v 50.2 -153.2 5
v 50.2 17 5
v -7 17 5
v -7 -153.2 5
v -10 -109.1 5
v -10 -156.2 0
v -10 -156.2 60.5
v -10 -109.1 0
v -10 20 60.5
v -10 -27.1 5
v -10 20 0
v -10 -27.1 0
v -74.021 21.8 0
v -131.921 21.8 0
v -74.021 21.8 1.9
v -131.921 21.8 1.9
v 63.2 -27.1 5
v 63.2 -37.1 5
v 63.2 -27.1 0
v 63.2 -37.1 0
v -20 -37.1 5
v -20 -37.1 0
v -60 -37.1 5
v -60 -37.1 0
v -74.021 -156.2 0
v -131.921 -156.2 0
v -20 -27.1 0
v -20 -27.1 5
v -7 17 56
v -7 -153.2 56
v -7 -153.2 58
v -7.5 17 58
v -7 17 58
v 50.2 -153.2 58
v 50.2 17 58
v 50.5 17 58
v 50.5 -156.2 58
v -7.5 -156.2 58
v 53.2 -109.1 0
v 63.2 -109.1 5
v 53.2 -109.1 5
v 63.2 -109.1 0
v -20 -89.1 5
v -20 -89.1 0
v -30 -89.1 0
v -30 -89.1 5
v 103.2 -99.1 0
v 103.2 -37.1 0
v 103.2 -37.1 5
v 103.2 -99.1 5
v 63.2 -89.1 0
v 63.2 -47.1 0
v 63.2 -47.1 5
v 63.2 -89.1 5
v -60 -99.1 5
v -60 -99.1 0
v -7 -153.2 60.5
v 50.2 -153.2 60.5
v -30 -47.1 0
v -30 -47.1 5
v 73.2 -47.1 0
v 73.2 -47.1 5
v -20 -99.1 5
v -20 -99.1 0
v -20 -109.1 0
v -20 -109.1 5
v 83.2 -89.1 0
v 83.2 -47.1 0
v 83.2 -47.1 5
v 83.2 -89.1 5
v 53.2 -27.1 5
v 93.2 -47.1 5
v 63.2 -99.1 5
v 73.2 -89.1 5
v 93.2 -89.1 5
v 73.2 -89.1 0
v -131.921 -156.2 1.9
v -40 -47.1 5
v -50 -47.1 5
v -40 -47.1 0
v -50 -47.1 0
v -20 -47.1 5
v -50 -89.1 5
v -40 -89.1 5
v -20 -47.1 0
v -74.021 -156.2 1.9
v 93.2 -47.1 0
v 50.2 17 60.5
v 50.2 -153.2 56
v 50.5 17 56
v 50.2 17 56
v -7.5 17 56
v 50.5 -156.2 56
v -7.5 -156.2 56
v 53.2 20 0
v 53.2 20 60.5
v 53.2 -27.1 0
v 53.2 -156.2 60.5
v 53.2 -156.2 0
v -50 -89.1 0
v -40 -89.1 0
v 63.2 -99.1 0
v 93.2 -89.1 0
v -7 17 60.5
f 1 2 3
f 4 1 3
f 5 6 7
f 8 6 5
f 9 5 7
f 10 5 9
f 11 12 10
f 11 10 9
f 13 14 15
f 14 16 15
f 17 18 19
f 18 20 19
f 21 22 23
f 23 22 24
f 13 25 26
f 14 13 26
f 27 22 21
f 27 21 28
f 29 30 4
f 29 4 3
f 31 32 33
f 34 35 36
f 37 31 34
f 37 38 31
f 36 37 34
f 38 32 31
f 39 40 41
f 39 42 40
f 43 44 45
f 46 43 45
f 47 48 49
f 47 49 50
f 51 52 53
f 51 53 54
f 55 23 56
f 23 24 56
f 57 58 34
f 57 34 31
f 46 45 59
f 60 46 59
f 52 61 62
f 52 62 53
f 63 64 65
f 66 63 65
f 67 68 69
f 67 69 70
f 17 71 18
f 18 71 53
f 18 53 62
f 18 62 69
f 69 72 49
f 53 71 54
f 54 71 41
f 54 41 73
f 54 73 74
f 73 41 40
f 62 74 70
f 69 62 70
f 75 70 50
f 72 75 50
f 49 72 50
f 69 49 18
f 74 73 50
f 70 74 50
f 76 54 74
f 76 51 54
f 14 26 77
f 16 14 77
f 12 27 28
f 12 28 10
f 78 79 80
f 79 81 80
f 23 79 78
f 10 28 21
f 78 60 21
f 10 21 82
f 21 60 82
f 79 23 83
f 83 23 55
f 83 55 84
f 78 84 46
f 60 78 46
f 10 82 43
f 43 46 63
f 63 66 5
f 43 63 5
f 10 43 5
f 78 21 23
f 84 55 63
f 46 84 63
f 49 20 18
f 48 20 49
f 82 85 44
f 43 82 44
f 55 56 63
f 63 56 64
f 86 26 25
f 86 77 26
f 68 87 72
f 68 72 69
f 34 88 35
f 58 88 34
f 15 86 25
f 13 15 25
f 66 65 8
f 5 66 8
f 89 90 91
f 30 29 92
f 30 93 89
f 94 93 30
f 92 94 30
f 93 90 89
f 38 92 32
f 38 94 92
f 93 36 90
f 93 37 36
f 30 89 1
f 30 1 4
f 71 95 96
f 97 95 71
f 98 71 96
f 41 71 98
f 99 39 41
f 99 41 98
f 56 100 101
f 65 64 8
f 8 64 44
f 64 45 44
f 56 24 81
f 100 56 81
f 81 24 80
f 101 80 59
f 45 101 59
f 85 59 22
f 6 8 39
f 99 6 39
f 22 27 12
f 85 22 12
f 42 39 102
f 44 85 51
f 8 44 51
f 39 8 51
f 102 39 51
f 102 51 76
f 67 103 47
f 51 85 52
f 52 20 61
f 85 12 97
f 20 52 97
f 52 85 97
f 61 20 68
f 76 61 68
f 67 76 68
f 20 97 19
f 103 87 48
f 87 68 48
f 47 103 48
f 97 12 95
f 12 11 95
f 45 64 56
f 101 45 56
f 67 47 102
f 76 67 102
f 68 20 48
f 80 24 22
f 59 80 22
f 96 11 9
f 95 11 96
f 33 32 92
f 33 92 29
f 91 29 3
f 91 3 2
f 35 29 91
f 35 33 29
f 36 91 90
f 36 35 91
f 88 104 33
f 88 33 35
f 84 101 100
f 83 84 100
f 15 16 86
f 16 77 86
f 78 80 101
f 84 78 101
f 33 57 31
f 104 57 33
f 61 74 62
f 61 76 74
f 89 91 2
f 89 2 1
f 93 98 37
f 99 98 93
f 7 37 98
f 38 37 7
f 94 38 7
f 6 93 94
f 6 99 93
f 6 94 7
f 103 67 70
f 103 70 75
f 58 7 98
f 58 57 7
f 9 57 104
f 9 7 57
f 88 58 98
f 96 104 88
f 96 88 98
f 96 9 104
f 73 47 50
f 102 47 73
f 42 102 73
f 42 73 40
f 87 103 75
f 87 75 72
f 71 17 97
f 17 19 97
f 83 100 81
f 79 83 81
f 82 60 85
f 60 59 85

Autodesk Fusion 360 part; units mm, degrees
sketch "Sketch1" plane through (0, 0, 0) normal (0, 0, 1) x (1, 0, 0)
  line L0 (-10, 20) -> (53.2, 20)
  line L1 (53.2, 20) -> (53.2, -156.2)
  line L2 (53.2, -156.2) -> (-10, -156.2)
  line L3 (-10, -156.2) -> (-10, 20)
  dimension "d1" = 63.2
  dimension "d2" = 176.2
extrude "Extrude1" add sketch "Sketch1" along normal blind 60.5 makes body 1
sketch "Sketch2" plane through (0, 0, 60.5) normal (0, 0, 1) x (-1, 0, 0)
  line L0 (10, 156.2) -> (-53.2, 156.2)
  line L1 (-53.2, 156.2) -> (-53.2, -20)
  line L2 (-53.2, -20) -> (10, -20)
  line L3 (10, -20) -> (10, 156.2)
  line L4 (7, -17) -> (-50.2, -17)
  line L5 (-50.2, -17) -> (-50.2, 153.2)
  line L6 (-50.2, 153.2) -> (7, 153.2)
  line L7 (7, 153.2) -> (7, -17)
  dimension "d10" = 57.2
  dimension "d11" = 170.2
  dimension "d12" = 3
  dimension "d13" = 3
extrude "Extrude3" cut sketch "Sketch2" against normal blind 55.5 contours L4 L5 L6 L7 bodies 1
sketch "Sketch4" plane through (0, -156.2, 0) normal (0, -1, 0) x (1, 0, 0)
  line L0 (-10, 0) -> (53.2, 0)
  line L1 (53.2, 0) -> (53.2, 60.5)
  line L2 (53.2, 60.5) -> (-10, 60.5)
  line L3 (-10, 60.5) -> (-10, 0)
  line L4 (-7.5, 58) -> (50.5, 58)
  line L5 (50.5, 58) -> (50.5, 56)
  line L6 (50.5, 56) -> (-7.5, 56)
  line L7 (-7.5, 56) -> (-7.5, 58)
  line L8 (50.2, 60.5) -> (-7, 60.5)
  line L9 (-131.921, 1.9) -> (-74.021, 1.9)
  line L10 (-74.021, 1.9) -> (-74.021, 0)
  line L11 (-74.021, 0) -> (-131.921, 0)
  line L12 (-131.921, 0) -> (-131.921, 1.9)
  dimension "d22" = 58
  dimension "d23" = 2
  dimension "d24" = 2.5
  dimension "d25" = 2.5
  dimension "d40" = 1.9
  dimension "d41" = 57.9
extrude "Extrude4" cut sketch "Sketch4" against normal blind 173.2 contours L4 L5 L6 L7 | L9 L10 L11 L12 bodies 1
extrude "Extrude6" add sketch "Sketch4" against normal blind 178 separate body contours L9 L10 L11 L12 makes body 2
sketch "Sketch5" plane through (0, 0, 0) normal (0, 0, -1) x (1, 0, 0)
  line L0 (53.2, 156.2) -> (-10, 156.2)
  line L1 (-10, 156.2) -> (-10, -20)
  line L2 (-10, -20) -> (53.2, -20)
  line L3 (-10, 37.1) -> (-60, 37.1)
  line L4 (-60, 37.1) -> (-60, 99.1)
  line L5 (-60, 99.1) -> (-10, 99.1)
  line L6 (-10, 99.1) -> (-10, 37.1)
  line L7 (53.2, -20) -> (-10, -20)
  line L8 (-50, 47.1) -> (-40, 47.1)
  line L9 (-40, 47.1) -> (-40, 89.1)
  line L10 (-40, 89.1) -> (-50, 89.1)
  line L11 (-50, 89.1) -> (-50, 47.1)
  line L12 (-30, 47.1) -> (-20, 47.1)
  line L13 (-20, 47.1) -> (-20, 89.1)
  line L14 (-20, 89.1) -> (-30, 89.1)
  line L15 (-30, 89.1) -> (-30, 47.1)
  line L16 (21.6, 39.3466) -> (21.6, 140)
  line L17 (-10, -20) -> (-10, 156.2)
  line L18 (83.2, 47.1) -> (83.2, 89.1)
  line L19 (73.2, 89.1) -> (73.2, 47.1)
  line L20 (73.2, 47.1) -> (63.2, 47.1)
  line L21 (53.2, 37.1) -> (103.2, 37.1)
  line L22 (83.2, 89.1) -> (93.2, 89.1)
  line L23 (63.2, 47.1) -> (63.2, 89.1)
  line L24 (53.2, 99.1) -> (53.2, 37.1)
  line L25 (63.2, 89.1) -> (73.2, 89.1)
  line L26 (103.2, 37.1) -> (103.2, 99.1)
  line L27 (93.2, 89.1) -> (93.2, 47.1)
  line L28 (103.2, 99.1) -> (53.2, 99.1)
  line L29 (93.2, 47.1) -> (83.2, 47.1)
  line L30 (-10, 37.1) -> (-20, 37.1)
  line L31 (-20, 37.1) -> (-20, 27.1)
  line L32 (-20, 27.1) -> (-10, 27.1)
  line L33 (-10, 27.1) -> (-10, 37.1)
  line L34 (-10, 99.1) -> (-20, 99.1)
  line L35 (-20, 99.1) -> (-20, 109.1)
  line L36 (-20, 109.1) -> (-10, 109.1)
  line L37 (-10, 109.1) -> (-10, 99.1)
  line L38 (83.2, 89.1) -> (93.2, 89.1)
  line L39 (63.2, 109.1) -> (53.2, 109.1)
  line L40 (53.2, 99.1) -> (63.2, 99.1)
  line L41 (83.2, 47.1) -> (83.2, 89.1)
  line L42 (53.2, 37.1) -> (103.2, 37.1)
  line L43 (63.2, 27.1) -> (53.2, 27.1)
  line L44 (93.2, 47.1) -> (83.2, 47.1)
  line L45 (73.2, 89.1) -> (73.2, 47.1)
  line L46 (63.2, 99.1) -> (63.2, 109.1)
  line L47 (53.2, 37.1) -> (63.2, 37.1)
  line L48 (73.2, 47.1) -> (63.2, 47.1)
  line L49 (103.2, 99.1) -> (53.2, 99.1)
  line L50 (53.2, 99.1) -> (53.2, 37.1)
  line L51 (53.2, 27.1) -> (53.2, 37.1)
  line L52 (63.2, 89.1) -> (73.2, 89.1)
  line L53 (63.2, 47.1) -> (63.2, 89.1)
  line L54 (93.2, 89.1) -> (93.2, 47.1)
  line L55 (53.2, 109.1) -> (53.2, 99.1)
  line L56 (63.2, 37.1) -> (63.2, 27.1)
  dimension "d28" = 57.1
  dimension "d29" = 62
  dimension "d30" = 50
  dimension "d31" = 42
  dimension "d32" = 10
  dimension "d34" = 10
  dimension "d35" = 10
  dimension "d36" = 10
  dimension "d37" = 31.6
  dimension "d44" = 10
  dimension "d45" = 10
  dimension "d46" = 10
  dimension "d47" = 10
extrude "Extrude5" add sketch "Sketch5" against normal blind 5 bodies 1
sketch "Sketch6" plane through (0, -156.2, 0) normal (0, -1, 0) x (1, 0, 0)
  line L0 (50.5, 56) -> (-7.5, 56)
  line L1 (-7.5, 56) -> (-7.5, 58)
  line L2 (-7.5, 58) -> (50.5, 58)
  line L3 (-10, 0) -> (53.2, 0)
  line L4 (53.2, 0) -> (53.2, 60.5)
  line L5 (53.2, 60.5) -> (-10, 60.5)
  line L6 (-10, 60.5) -> (-10, 0)
  line L7 (50.5, 58) -> (50.5, 56)
equation "d2 = 18.02 cm - 0.4 cm"
equation "d8 = 6.45 cm - 0.4 cm"
equation "d22 = 6.2 cm - 0.4 cm"
equation "d40 = 2 mm - 0.1 mm"
equation "d41 = 62 mm - 0.1 mm - 0.4 cm"
